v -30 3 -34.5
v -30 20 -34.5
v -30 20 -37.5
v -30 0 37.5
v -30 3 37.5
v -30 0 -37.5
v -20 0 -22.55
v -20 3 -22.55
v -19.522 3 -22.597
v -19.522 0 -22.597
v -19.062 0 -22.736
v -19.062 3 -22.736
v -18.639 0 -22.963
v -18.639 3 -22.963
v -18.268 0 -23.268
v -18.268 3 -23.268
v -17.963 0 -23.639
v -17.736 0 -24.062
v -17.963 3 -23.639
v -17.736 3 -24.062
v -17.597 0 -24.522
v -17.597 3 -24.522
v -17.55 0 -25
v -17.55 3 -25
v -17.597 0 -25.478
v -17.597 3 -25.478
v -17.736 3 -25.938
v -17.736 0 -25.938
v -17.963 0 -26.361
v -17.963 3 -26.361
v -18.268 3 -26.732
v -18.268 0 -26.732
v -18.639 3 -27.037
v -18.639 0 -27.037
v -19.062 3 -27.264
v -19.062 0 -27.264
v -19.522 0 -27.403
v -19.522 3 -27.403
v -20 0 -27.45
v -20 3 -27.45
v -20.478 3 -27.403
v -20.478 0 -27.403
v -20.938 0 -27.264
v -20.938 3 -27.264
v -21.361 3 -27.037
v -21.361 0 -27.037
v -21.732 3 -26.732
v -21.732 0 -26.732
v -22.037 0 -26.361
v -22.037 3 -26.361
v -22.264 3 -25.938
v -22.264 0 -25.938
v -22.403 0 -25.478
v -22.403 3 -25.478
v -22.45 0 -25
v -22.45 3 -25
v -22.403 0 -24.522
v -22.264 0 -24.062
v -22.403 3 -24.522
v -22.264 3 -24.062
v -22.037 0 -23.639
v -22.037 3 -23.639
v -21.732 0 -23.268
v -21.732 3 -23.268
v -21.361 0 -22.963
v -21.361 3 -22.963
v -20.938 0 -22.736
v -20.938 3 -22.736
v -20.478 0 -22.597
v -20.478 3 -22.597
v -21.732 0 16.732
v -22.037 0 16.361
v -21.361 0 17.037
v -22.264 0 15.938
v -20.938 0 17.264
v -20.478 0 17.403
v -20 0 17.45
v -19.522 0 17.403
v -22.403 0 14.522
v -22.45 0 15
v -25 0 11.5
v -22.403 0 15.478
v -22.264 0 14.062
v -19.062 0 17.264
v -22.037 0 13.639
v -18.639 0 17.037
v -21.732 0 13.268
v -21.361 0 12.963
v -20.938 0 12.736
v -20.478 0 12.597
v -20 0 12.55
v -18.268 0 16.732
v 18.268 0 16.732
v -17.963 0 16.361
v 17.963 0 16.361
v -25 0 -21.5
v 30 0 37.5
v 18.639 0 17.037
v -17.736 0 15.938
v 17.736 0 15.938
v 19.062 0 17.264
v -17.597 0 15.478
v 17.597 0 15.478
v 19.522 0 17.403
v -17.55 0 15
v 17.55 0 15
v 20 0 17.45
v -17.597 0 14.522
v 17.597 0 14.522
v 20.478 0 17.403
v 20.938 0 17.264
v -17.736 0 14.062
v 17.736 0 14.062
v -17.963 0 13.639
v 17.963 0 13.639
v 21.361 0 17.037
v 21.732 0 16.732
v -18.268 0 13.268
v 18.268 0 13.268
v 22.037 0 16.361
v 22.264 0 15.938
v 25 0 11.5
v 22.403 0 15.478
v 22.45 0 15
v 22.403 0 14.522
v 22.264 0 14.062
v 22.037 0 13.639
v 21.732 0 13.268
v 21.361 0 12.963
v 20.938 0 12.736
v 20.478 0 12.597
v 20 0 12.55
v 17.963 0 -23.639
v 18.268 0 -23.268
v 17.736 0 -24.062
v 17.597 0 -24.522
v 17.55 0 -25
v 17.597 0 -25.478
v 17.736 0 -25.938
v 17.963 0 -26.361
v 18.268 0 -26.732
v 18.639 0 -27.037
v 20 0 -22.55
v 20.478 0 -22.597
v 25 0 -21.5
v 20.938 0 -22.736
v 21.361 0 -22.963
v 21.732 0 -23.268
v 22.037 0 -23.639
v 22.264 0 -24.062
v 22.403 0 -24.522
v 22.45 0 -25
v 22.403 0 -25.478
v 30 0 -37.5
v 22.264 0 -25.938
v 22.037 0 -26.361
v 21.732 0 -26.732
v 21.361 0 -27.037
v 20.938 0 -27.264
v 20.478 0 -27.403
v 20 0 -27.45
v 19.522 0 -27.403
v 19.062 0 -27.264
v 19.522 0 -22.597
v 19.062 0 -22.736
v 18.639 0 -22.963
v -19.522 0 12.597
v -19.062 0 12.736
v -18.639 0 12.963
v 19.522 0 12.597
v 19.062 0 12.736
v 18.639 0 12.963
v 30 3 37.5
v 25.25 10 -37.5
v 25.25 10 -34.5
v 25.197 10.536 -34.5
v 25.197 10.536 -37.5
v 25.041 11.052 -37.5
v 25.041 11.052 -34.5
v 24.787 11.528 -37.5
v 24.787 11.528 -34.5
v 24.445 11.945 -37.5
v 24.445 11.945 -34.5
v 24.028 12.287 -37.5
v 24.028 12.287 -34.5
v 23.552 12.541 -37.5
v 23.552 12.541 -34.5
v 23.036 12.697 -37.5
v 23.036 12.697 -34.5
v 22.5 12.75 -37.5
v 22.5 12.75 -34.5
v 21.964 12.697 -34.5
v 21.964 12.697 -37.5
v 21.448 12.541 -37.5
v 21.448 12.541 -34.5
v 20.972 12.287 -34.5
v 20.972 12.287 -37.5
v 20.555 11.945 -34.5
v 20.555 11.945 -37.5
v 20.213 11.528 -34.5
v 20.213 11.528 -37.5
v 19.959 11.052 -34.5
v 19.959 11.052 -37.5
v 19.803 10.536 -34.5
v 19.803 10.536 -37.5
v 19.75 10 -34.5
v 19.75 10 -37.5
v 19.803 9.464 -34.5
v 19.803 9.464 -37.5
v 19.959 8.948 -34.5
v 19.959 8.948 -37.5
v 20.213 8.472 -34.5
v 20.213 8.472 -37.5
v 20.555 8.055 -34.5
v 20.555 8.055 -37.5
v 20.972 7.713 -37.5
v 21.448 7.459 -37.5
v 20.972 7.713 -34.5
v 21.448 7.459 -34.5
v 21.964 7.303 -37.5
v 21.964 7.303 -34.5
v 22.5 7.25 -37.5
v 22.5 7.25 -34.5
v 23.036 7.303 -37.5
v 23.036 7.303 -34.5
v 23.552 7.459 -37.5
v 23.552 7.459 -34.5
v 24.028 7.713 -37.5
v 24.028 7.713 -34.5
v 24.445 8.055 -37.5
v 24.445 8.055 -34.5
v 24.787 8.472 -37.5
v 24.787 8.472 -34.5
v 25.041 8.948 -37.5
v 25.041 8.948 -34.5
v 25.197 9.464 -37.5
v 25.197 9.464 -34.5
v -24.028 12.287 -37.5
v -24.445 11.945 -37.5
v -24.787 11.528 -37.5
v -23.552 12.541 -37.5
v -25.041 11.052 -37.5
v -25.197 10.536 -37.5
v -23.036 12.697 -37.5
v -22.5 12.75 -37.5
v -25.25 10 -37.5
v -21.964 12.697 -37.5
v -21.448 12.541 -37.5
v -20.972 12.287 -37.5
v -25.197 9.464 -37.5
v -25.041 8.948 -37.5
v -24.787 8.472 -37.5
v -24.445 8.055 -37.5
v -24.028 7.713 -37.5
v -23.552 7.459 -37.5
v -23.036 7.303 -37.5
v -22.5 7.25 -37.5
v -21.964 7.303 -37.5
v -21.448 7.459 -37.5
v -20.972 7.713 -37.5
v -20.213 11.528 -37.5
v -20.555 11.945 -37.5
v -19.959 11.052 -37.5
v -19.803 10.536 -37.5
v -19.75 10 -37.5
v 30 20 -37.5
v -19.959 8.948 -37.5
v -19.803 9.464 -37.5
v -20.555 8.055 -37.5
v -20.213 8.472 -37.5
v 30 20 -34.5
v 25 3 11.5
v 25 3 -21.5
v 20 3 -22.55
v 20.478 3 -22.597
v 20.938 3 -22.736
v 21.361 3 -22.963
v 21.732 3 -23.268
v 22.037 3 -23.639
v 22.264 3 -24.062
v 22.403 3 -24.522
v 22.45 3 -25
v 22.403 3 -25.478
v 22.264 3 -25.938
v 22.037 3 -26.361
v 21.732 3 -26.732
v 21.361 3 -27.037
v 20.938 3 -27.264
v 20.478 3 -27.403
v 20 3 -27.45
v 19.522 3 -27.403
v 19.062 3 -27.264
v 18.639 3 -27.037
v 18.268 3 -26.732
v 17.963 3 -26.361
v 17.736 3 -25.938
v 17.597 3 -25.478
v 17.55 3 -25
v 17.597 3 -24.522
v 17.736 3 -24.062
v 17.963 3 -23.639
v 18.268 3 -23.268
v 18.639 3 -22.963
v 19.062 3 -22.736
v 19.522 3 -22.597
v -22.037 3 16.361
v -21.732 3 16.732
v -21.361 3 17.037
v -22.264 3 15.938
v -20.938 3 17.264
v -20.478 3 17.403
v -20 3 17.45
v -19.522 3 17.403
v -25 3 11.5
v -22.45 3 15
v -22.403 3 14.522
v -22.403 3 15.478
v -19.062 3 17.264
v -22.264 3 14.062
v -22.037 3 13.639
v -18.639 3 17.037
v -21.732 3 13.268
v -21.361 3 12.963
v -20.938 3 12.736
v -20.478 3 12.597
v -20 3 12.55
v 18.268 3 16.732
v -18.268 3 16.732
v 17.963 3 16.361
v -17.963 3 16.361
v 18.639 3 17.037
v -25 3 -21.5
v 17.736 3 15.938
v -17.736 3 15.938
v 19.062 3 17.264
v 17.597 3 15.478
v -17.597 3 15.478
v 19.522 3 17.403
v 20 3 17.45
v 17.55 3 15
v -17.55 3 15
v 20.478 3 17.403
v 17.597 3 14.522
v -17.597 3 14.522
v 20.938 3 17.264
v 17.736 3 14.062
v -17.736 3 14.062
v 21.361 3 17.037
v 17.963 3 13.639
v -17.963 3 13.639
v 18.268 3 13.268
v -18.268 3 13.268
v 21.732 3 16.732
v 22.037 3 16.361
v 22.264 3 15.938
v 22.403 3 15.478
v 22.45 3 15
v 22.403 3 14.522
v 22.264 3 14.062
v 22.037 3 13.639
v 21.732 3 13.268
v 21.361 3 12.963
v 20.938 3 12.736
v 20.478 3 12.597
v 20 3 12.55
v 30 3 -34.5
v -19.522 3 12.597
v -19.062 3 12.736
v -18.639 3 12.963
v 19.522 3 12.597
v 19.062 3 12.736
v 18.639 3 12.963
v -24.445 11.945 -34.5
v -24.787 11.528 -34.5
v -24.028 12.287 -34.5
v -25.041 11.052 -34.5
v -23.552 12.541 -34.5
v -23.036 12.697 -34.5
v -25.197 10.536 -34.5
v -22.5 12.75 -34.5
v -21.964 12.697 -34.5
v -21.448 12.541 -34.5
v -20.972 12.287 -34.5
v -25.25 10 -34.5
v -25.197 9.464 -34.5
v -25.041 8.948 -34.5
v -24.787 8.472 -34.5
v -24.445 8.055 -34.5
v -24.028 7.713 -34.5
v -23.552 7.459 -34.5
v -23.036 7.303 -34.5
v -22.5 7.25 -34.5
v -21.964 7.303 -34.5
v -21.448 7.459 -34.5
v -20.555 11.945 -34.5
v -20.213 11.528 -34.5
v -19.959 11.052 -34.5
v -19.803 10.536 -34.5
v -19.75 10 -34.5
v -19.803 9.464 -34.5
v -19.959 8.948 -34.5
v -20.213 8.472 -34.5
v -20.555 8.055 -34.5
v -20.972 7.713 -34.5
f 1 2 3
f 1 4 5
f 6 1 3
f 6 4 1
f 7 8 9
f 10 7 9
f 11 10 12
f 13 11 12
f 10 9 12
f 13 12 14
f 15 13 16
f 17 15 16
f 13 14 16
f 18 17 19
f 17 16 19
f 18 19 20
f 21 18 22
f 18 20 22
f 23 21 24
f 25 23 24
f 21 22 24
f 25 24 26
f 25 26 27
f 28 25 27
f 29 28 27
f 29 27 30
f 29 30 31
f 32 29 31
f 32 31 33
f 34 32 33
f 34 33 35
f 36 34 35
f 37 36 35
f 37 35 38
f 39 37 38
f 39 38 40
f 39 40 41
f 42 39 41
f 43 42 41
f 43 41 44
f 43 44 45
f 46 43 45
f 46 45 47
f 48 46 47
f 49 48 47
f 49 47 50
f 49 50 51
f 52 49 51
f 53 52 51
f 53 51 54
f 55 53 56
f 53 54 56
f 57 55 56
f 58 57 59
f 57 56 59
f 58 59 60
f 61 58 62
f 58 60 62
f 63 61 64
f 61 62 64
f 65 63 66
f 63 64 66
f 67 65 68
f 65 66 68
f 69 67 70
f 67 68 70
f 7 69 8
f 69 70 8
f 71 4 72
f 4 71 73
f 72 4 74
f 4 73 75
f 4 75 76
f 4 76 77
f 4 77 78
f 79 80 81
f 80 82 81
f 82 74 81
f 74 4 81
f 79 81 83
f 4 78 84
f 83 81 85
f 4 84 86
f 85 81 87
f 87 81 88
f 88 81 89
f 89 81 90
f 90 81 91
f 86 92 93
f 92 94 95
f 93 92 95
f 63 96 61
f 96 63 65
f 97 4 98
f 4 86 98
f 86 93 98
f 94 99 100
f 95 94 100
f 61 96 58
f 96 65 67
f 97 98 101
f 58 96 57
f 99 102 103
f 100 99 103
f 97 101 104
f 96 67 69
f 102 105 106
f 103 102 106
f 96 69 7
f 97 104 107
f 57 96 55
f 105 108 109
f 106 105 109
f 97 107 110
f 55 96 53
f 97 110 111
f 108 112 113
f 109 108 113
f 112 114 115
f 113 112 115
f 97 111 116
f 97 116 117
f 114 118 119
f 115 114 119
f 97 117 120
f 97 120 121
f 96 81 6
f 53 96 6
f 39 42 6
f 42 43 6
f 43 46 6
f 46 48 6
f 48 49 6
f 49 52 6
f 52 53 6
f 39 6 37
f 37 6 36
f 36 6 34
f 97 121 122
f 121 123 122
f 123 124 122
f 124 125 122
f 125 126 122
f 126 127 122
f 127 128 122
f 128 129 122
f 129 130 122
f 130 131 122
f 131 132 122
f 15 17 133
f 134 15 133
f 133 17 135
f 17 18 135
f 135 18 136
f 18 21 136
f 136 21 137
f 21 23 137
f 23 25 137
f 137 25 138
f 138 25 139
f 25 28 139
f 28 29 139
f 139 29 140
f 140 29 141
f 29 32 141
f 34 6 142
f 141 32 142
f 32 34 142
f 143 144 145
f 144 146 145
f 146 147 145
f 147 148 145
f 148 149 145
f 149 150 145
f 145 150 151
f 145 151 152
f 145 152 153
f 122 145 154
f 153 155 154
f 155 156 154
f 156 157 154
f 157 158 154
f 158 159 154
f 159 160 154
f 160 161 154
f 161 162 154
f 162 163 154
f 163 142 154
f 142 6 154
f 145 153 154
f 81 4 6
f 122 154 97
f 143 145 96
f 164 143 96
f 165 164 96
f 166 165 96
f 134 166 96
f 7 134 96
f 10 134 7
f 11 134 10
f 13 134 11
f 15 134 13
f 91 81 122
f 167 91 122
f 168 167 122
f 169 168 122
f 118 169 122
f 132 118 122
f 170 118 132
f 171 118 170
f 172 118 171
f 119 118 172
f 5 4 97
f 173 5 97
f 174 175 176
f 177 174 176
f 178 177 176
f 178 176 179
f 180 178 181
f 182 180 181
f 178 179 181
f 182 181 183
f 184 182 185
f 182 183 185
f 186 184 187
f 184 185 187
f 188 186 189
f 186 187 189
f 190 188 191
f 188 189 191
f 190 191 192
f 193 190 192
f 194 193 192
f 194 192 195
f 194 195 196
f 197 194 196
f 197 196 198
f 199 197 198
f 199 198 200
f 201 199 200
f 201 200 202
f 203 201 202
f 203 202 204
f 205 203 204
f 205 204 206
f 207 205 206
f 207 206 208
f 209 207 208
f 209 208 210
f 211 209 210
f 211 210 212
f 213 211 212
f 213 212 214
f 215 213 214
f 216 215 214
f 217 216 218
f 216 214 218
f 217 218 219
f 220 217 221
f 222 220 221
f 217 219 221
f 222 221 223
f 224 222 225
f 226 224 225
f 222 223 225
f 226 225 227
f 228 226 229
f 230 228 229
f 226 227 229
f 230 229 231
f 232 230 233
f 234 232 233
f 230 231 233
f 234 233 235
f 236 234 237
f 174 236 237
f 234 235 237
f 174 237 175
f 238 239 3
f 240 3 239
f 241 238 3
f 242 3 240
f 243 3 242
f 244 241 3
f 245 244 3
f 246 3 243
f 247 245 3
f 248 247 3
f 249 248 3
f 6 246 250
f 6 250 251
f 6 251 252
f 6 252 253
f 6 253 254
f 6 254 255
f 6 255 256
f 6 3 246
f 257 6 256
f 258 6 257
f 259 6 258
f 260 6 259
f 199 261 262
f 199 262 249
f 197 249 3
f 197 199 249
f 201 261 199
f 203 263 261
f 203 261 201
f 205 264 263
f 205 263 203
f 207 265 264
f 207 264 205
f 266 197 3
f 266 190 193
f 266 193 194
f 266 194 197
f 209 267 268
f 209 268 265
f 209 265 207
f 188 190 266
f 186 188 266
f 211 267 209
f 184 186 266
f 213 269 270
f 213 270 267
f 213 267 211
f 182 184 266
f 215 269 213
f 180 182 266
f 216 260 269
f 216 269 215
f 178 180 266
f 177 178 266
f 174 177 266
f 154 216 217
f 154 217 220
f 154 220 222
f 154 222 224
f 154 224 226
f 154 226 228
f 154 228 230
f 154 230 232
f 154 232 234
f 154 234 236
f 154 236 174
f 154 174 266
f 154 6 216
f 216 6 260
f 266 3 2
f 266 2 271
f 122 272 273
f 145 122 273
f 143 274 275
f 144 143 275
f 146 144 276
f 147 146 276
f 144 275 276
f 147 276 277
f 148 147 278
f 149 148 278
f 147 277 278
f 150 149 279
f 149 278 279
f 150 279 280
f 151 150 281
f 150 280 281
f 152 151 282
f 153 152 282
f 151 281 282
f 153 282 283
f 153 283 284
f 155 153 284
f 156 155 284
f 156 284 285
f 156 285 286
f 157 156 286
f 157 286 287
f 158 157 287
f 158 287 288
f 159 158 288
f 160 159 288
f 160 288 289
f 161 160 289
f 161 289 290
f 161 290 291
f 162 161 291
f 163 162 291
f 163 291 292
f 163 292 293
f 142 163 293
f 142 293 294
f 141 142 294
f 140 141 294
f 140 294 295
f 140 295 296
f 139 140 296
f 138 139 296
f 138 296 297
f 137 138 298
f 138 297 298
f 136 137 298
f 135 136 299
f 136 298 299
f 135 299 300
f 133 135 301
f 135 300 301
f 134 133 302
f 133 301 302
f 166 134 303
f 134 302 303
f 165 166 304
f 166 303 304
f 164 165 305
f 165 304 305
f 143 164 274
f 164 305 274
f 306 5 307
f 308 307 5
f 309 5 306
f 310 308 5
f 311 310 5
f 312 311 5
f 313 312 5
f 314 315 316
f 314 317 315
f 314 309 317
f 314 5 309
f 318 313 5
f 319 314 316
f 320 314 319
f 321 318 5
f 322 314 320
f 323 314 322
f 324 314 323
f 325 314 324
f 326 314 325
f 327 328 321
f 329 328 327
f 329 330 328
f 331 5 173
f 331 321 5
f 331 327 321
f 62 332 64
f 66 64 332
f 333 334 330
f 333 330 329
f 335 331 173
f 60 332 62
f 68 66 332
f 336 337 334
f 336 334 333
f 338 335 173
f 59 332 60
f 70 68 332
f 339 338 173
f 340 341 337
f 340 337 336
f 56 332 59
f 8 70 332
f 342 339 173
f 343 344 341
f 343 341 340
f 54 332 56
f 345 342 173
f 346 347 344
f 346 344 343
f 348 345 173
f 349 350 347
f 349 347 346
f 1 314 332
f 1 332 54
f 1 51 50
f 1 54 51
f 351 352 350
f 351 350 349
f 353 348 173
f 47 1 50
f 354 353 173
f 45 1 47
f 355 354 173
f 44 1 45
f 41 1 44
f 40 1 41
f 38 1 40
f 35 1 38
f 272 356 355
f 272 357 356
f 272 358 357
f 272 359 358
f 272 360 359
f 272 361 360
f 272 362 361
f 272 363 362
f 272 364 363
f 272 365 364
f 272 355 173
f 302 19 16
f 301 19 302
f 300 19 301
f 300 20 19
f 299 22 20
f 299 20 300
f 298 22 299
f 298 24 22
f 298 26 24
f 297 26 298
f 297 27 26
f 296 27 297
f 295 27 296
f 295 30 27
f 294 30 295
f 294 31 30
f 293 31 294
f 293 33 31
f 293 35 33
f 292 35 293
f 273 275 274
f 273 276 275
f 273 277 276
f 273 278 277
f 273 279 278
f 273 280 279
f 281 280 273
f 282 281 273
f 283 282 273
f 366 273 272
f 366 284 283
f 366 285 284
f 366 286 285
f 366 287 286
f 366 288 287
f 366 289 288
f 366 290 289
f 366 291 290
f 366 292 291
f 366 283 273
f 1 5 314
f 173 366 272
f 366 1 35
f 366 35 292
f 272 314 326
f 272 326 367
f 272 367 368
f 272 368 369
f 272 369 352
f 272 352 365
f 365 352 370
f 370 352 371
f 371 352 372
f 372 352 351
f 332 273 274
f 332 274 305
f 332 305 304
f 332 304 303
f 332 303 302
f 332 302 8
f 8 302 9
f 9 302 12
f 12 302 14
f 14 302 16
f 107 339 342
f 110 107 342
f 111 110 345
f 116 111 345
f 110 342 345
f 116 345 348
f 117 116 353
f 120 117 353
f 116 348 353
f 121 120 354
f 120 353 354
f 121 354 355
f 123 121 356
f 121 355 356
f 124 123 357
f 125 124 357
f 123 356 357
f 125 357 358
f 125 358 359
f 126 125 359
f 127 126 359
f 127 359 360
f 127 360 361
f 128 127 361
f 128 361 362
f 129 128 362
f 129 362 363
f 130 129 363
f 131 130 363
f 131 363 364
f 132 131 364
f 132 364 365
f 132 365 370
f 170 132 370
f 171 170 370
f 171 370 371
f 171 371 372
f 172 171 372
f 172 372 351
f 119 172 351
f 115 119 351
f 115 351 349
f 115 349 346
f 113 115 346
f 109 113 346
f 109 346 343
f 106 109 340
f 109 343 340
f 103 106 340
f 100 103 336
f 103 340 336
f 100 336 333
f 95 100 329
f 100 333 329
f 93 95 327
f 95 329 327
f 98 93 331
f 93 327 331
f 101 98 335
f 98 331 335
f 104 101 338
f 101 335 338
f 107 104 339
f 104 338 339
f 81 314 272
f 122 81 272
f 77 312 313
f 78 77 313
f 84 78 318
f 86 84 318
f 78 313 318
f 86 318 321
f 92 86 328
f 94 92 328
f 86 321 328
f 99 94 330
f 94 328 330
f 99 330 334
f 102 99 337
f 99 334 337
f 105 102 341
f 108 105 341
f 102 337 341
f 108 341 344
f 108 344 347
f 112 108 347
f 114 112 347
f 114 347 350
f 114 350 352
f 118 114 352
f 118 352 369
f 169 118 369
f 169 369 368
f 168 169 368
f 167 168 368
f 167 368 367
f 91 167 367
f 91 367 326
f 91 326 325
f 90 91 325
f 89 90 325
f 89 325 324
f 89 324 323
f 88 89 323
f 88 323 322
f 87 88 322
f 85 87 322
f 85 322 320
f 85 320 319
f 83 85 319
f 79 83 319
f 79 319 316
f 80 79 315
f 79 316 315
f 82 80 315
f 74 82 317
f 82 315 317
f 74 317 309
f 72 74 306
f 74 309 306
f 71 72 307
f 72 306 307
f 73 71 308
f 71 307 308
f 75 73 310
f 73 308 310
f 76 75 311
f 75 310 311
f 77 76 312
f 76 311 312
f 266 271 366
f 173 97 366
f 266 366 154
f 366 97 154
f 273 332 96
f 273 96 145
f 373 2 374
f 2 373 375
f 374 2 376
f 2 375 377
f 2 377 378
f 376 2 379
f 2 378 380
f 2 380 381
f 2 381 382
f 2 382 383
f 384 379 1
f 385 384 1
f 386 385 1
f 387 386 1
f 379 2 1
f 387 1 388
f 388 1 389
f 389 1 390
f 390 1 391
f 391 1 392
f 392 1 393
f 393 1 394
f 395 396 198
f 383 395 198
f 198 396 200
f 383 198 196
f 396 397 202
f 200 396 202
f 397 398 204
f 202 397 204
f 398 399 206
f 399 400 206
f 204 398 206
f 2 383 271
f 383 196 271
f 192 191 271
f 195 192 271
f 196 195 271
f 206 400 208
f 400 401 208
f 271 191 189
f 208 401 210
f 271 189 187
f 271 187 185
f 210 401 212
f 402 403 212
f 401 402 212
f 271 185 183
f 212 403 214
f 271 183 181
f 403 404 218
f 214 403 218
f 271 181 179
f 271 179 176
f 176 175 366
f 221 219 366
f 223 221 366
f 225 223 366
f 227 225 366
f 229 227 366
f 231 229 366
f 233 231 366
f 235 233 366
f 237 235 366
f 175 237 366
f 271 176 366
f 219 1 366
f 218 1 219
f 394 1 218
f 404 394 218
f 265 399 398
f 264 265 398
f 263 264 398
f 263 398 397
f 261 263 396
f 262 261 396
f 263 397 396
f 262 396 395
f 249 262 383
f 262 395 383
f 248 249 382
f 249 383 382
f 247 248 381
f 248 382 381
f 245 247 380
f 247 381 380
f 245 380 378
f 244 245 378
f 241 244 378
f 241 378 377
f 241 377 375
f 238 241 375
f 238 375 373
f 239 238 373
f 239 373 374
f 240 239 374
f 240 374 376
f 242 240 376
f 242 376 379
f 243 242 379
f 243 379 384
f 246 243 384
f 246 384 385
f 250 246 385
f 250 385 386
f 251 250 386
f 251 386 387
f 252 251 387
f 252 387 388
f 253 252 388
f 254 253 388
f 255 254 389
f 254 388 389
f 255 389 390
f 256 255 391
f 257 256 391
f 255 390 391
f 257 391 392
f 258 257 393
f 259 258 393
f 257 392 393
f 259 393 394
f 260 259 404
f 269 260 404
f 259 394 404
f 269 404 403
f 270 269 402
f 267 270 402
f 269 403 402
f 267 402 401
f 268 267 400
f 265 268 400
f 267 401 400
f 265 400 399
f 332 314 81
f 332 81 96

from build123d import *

# Parameters (mm, degrees)
SKETCH1_W            = 60
SKETCH1_H            = 75
BOSS_EXTRUDE1_DEPTH  = 3
SKETCH2_W            = 60
SKETCH2_H            = 3
BOSS_EXTRUDE2_DEPTH  = 17
CUT_EXTRUDE1_REACH   = 52.944
SKETCH3_W            = 50
SKETCH3_H            = 33
CUT_EXTRUDE2_REACH   = 52.944
SKETCH4_R            = 2.45
M5_CLEARANCE_HOLE1_D = 5.5


with BuildPart() as part:
    # Sketch1 → Boss-Extrude1 (new body)
    with BuildSketch(Plane(origin=(0, 0, 0), x_dir=(1, 0, 0), z_dir=(0, 1, 0))):
        Rectangle(SKETCH1_W, SKETCH1_H)
    extrude(amount=BOSS_EXTRUDE1_DEPTH)

    # Sketch2 → Boss-Extrude2 (add)
    with BuildSketch(Plane(origin=(0, 3, 0), x_dir=(1, 0, 0), z_dir=(0, 1, 0))):
        with Locations((0, 36)):
            Rectangle(SKETCH2_W, SKETCH2_H)
    extrude(amount=BOSS_EXTRUDE2_DEPTH)

    # Sketch3 → Cut-Extrude1 (cut, up to next)
    with BuildSketch(Plane(origin=(0, 3, 0), x_dir=(1, 0, 0), z_dir=(0, 1, 0)), mode=Mode.PRIVATE) as cut_extrude1_sk1:
        with Locations((0, 5)):
            Rectangle(SKETCH3_W, SKETCH3_H)
    cut_extrude1_tool1 = extrude(cut_extrude1_sk1.sketch, amount=-CUT_EXTRUDE1_REACH, mode=Mode.PRIVATE) & part.part
    add(cut_extrude1_tool1.solids().sort_by_distance((0, 3, -5))[0], mode=Mode.SUBTRACT)

    # Sketch4 → Cut-Extrude2 (cut, up to next)
    with BuildSketch(Plane(origin=(0, 3, 0), x_dir=(1, 0, 0), z_dir=(0, 1, 0)), mode=Mode.PRIVATE) as cut_extrude2_sk1:
        with Locations(Location((-20, 25, 0), (0, 0, 270))):
            Circle(SKETCH4_R)
    cut_extrude2_tool1 = extrude(cut_extrude2_sk1.sketch, amount=-CUT_EXTRUDE2_REACH, mode=Mode.PRIVATE) & part.part
    # Sketch4 → Cut-Extrude2 (cut, up to next)
    with BuildSketch(Plane(origin=(0, 3, 0), x_dir=(1, 0, 0), z_dir=(0, 1, 0)), mode=Mode.PRIVATE) as cut_extrude2_sk2:
        with Locations(Location((20, 25, 0), (0, 0, 270))):
            Circle(SKETCH4_R)
    cut_extrude2_tool2 = extrude(cut_extrude2_sk2.sketch, amount=-CUT_EXTRUDE2_REACH, mode=Mode.PRIVATE) & part.part
    # Sketch4 → Cut-Extrude2 (cut, up to next)
    with BuildSketch(Plane(origin=(0, 3, 0), x_dir=(1, 0, 0), z_dir=(0, 1, 0)), mode=Mode.PRIVATE) as cut_extrude2_sk3:
        with Locations(Location((20, -15, 0), (0, 0, 270))):
            Circle(SKETCH4_R)
    cut_extrude2_tool3 = extrude(cut_extrude2_sk3.sketch, amount=-CUT_EXTRUDE2_REACH, mode=Mode.PRIVATE) & part.part
    # Sketch4 → Cut-Extrude2 (cut, up to next)
    with BuildSketch(Plane(origin=(0, 3, 0), x_dir=(1, 0, 0), z_dir=(0, 1, 0)), mode=Mode.PRIVATE) as cut_extrude2_sk4:
        with Locations(Location((-20, -15, 0), (0, 0, 270))):
            Circle(SKETCH4_R)
    cut_extrude2_tool4 = extrude(cut_extrude2_sk4.sketch, amount=-CUT_EXTRUDE2_REACH, mode=Mode.PRIVATE) & part.part
    add(cut_extrude2_tool1.solids().sort_by_distance((-20, 3, -25))[0], mode=Mode.SUBTRACT)
    add(cut_extrude2_tool2.solids().sort_by_distance((20, 3, -25))[0], mode=Mode.SUBTRACT)
    add(cut_extrude2_tool3.solids().sort_by_distance((20, 3, 15))[0], mode=Mode.SUBTRACT)
    add(cut_extrude2_tool4.solids().sort_by_distance((-20, 3, 15))[0], mode=Mode.SUBTRACT)

    # M5 Clearance Hole1 (through all)
    with Locations(Plane(origin=(22.5, 10, -37.5), x_dir=(-1, 0, 0), z_dir=(0, 0, -1))):
        with Locations((0, 0), (45, 0)):
            Hole(M5_CLEARANCE_HOLE1_D / 2)


solid = part.part
